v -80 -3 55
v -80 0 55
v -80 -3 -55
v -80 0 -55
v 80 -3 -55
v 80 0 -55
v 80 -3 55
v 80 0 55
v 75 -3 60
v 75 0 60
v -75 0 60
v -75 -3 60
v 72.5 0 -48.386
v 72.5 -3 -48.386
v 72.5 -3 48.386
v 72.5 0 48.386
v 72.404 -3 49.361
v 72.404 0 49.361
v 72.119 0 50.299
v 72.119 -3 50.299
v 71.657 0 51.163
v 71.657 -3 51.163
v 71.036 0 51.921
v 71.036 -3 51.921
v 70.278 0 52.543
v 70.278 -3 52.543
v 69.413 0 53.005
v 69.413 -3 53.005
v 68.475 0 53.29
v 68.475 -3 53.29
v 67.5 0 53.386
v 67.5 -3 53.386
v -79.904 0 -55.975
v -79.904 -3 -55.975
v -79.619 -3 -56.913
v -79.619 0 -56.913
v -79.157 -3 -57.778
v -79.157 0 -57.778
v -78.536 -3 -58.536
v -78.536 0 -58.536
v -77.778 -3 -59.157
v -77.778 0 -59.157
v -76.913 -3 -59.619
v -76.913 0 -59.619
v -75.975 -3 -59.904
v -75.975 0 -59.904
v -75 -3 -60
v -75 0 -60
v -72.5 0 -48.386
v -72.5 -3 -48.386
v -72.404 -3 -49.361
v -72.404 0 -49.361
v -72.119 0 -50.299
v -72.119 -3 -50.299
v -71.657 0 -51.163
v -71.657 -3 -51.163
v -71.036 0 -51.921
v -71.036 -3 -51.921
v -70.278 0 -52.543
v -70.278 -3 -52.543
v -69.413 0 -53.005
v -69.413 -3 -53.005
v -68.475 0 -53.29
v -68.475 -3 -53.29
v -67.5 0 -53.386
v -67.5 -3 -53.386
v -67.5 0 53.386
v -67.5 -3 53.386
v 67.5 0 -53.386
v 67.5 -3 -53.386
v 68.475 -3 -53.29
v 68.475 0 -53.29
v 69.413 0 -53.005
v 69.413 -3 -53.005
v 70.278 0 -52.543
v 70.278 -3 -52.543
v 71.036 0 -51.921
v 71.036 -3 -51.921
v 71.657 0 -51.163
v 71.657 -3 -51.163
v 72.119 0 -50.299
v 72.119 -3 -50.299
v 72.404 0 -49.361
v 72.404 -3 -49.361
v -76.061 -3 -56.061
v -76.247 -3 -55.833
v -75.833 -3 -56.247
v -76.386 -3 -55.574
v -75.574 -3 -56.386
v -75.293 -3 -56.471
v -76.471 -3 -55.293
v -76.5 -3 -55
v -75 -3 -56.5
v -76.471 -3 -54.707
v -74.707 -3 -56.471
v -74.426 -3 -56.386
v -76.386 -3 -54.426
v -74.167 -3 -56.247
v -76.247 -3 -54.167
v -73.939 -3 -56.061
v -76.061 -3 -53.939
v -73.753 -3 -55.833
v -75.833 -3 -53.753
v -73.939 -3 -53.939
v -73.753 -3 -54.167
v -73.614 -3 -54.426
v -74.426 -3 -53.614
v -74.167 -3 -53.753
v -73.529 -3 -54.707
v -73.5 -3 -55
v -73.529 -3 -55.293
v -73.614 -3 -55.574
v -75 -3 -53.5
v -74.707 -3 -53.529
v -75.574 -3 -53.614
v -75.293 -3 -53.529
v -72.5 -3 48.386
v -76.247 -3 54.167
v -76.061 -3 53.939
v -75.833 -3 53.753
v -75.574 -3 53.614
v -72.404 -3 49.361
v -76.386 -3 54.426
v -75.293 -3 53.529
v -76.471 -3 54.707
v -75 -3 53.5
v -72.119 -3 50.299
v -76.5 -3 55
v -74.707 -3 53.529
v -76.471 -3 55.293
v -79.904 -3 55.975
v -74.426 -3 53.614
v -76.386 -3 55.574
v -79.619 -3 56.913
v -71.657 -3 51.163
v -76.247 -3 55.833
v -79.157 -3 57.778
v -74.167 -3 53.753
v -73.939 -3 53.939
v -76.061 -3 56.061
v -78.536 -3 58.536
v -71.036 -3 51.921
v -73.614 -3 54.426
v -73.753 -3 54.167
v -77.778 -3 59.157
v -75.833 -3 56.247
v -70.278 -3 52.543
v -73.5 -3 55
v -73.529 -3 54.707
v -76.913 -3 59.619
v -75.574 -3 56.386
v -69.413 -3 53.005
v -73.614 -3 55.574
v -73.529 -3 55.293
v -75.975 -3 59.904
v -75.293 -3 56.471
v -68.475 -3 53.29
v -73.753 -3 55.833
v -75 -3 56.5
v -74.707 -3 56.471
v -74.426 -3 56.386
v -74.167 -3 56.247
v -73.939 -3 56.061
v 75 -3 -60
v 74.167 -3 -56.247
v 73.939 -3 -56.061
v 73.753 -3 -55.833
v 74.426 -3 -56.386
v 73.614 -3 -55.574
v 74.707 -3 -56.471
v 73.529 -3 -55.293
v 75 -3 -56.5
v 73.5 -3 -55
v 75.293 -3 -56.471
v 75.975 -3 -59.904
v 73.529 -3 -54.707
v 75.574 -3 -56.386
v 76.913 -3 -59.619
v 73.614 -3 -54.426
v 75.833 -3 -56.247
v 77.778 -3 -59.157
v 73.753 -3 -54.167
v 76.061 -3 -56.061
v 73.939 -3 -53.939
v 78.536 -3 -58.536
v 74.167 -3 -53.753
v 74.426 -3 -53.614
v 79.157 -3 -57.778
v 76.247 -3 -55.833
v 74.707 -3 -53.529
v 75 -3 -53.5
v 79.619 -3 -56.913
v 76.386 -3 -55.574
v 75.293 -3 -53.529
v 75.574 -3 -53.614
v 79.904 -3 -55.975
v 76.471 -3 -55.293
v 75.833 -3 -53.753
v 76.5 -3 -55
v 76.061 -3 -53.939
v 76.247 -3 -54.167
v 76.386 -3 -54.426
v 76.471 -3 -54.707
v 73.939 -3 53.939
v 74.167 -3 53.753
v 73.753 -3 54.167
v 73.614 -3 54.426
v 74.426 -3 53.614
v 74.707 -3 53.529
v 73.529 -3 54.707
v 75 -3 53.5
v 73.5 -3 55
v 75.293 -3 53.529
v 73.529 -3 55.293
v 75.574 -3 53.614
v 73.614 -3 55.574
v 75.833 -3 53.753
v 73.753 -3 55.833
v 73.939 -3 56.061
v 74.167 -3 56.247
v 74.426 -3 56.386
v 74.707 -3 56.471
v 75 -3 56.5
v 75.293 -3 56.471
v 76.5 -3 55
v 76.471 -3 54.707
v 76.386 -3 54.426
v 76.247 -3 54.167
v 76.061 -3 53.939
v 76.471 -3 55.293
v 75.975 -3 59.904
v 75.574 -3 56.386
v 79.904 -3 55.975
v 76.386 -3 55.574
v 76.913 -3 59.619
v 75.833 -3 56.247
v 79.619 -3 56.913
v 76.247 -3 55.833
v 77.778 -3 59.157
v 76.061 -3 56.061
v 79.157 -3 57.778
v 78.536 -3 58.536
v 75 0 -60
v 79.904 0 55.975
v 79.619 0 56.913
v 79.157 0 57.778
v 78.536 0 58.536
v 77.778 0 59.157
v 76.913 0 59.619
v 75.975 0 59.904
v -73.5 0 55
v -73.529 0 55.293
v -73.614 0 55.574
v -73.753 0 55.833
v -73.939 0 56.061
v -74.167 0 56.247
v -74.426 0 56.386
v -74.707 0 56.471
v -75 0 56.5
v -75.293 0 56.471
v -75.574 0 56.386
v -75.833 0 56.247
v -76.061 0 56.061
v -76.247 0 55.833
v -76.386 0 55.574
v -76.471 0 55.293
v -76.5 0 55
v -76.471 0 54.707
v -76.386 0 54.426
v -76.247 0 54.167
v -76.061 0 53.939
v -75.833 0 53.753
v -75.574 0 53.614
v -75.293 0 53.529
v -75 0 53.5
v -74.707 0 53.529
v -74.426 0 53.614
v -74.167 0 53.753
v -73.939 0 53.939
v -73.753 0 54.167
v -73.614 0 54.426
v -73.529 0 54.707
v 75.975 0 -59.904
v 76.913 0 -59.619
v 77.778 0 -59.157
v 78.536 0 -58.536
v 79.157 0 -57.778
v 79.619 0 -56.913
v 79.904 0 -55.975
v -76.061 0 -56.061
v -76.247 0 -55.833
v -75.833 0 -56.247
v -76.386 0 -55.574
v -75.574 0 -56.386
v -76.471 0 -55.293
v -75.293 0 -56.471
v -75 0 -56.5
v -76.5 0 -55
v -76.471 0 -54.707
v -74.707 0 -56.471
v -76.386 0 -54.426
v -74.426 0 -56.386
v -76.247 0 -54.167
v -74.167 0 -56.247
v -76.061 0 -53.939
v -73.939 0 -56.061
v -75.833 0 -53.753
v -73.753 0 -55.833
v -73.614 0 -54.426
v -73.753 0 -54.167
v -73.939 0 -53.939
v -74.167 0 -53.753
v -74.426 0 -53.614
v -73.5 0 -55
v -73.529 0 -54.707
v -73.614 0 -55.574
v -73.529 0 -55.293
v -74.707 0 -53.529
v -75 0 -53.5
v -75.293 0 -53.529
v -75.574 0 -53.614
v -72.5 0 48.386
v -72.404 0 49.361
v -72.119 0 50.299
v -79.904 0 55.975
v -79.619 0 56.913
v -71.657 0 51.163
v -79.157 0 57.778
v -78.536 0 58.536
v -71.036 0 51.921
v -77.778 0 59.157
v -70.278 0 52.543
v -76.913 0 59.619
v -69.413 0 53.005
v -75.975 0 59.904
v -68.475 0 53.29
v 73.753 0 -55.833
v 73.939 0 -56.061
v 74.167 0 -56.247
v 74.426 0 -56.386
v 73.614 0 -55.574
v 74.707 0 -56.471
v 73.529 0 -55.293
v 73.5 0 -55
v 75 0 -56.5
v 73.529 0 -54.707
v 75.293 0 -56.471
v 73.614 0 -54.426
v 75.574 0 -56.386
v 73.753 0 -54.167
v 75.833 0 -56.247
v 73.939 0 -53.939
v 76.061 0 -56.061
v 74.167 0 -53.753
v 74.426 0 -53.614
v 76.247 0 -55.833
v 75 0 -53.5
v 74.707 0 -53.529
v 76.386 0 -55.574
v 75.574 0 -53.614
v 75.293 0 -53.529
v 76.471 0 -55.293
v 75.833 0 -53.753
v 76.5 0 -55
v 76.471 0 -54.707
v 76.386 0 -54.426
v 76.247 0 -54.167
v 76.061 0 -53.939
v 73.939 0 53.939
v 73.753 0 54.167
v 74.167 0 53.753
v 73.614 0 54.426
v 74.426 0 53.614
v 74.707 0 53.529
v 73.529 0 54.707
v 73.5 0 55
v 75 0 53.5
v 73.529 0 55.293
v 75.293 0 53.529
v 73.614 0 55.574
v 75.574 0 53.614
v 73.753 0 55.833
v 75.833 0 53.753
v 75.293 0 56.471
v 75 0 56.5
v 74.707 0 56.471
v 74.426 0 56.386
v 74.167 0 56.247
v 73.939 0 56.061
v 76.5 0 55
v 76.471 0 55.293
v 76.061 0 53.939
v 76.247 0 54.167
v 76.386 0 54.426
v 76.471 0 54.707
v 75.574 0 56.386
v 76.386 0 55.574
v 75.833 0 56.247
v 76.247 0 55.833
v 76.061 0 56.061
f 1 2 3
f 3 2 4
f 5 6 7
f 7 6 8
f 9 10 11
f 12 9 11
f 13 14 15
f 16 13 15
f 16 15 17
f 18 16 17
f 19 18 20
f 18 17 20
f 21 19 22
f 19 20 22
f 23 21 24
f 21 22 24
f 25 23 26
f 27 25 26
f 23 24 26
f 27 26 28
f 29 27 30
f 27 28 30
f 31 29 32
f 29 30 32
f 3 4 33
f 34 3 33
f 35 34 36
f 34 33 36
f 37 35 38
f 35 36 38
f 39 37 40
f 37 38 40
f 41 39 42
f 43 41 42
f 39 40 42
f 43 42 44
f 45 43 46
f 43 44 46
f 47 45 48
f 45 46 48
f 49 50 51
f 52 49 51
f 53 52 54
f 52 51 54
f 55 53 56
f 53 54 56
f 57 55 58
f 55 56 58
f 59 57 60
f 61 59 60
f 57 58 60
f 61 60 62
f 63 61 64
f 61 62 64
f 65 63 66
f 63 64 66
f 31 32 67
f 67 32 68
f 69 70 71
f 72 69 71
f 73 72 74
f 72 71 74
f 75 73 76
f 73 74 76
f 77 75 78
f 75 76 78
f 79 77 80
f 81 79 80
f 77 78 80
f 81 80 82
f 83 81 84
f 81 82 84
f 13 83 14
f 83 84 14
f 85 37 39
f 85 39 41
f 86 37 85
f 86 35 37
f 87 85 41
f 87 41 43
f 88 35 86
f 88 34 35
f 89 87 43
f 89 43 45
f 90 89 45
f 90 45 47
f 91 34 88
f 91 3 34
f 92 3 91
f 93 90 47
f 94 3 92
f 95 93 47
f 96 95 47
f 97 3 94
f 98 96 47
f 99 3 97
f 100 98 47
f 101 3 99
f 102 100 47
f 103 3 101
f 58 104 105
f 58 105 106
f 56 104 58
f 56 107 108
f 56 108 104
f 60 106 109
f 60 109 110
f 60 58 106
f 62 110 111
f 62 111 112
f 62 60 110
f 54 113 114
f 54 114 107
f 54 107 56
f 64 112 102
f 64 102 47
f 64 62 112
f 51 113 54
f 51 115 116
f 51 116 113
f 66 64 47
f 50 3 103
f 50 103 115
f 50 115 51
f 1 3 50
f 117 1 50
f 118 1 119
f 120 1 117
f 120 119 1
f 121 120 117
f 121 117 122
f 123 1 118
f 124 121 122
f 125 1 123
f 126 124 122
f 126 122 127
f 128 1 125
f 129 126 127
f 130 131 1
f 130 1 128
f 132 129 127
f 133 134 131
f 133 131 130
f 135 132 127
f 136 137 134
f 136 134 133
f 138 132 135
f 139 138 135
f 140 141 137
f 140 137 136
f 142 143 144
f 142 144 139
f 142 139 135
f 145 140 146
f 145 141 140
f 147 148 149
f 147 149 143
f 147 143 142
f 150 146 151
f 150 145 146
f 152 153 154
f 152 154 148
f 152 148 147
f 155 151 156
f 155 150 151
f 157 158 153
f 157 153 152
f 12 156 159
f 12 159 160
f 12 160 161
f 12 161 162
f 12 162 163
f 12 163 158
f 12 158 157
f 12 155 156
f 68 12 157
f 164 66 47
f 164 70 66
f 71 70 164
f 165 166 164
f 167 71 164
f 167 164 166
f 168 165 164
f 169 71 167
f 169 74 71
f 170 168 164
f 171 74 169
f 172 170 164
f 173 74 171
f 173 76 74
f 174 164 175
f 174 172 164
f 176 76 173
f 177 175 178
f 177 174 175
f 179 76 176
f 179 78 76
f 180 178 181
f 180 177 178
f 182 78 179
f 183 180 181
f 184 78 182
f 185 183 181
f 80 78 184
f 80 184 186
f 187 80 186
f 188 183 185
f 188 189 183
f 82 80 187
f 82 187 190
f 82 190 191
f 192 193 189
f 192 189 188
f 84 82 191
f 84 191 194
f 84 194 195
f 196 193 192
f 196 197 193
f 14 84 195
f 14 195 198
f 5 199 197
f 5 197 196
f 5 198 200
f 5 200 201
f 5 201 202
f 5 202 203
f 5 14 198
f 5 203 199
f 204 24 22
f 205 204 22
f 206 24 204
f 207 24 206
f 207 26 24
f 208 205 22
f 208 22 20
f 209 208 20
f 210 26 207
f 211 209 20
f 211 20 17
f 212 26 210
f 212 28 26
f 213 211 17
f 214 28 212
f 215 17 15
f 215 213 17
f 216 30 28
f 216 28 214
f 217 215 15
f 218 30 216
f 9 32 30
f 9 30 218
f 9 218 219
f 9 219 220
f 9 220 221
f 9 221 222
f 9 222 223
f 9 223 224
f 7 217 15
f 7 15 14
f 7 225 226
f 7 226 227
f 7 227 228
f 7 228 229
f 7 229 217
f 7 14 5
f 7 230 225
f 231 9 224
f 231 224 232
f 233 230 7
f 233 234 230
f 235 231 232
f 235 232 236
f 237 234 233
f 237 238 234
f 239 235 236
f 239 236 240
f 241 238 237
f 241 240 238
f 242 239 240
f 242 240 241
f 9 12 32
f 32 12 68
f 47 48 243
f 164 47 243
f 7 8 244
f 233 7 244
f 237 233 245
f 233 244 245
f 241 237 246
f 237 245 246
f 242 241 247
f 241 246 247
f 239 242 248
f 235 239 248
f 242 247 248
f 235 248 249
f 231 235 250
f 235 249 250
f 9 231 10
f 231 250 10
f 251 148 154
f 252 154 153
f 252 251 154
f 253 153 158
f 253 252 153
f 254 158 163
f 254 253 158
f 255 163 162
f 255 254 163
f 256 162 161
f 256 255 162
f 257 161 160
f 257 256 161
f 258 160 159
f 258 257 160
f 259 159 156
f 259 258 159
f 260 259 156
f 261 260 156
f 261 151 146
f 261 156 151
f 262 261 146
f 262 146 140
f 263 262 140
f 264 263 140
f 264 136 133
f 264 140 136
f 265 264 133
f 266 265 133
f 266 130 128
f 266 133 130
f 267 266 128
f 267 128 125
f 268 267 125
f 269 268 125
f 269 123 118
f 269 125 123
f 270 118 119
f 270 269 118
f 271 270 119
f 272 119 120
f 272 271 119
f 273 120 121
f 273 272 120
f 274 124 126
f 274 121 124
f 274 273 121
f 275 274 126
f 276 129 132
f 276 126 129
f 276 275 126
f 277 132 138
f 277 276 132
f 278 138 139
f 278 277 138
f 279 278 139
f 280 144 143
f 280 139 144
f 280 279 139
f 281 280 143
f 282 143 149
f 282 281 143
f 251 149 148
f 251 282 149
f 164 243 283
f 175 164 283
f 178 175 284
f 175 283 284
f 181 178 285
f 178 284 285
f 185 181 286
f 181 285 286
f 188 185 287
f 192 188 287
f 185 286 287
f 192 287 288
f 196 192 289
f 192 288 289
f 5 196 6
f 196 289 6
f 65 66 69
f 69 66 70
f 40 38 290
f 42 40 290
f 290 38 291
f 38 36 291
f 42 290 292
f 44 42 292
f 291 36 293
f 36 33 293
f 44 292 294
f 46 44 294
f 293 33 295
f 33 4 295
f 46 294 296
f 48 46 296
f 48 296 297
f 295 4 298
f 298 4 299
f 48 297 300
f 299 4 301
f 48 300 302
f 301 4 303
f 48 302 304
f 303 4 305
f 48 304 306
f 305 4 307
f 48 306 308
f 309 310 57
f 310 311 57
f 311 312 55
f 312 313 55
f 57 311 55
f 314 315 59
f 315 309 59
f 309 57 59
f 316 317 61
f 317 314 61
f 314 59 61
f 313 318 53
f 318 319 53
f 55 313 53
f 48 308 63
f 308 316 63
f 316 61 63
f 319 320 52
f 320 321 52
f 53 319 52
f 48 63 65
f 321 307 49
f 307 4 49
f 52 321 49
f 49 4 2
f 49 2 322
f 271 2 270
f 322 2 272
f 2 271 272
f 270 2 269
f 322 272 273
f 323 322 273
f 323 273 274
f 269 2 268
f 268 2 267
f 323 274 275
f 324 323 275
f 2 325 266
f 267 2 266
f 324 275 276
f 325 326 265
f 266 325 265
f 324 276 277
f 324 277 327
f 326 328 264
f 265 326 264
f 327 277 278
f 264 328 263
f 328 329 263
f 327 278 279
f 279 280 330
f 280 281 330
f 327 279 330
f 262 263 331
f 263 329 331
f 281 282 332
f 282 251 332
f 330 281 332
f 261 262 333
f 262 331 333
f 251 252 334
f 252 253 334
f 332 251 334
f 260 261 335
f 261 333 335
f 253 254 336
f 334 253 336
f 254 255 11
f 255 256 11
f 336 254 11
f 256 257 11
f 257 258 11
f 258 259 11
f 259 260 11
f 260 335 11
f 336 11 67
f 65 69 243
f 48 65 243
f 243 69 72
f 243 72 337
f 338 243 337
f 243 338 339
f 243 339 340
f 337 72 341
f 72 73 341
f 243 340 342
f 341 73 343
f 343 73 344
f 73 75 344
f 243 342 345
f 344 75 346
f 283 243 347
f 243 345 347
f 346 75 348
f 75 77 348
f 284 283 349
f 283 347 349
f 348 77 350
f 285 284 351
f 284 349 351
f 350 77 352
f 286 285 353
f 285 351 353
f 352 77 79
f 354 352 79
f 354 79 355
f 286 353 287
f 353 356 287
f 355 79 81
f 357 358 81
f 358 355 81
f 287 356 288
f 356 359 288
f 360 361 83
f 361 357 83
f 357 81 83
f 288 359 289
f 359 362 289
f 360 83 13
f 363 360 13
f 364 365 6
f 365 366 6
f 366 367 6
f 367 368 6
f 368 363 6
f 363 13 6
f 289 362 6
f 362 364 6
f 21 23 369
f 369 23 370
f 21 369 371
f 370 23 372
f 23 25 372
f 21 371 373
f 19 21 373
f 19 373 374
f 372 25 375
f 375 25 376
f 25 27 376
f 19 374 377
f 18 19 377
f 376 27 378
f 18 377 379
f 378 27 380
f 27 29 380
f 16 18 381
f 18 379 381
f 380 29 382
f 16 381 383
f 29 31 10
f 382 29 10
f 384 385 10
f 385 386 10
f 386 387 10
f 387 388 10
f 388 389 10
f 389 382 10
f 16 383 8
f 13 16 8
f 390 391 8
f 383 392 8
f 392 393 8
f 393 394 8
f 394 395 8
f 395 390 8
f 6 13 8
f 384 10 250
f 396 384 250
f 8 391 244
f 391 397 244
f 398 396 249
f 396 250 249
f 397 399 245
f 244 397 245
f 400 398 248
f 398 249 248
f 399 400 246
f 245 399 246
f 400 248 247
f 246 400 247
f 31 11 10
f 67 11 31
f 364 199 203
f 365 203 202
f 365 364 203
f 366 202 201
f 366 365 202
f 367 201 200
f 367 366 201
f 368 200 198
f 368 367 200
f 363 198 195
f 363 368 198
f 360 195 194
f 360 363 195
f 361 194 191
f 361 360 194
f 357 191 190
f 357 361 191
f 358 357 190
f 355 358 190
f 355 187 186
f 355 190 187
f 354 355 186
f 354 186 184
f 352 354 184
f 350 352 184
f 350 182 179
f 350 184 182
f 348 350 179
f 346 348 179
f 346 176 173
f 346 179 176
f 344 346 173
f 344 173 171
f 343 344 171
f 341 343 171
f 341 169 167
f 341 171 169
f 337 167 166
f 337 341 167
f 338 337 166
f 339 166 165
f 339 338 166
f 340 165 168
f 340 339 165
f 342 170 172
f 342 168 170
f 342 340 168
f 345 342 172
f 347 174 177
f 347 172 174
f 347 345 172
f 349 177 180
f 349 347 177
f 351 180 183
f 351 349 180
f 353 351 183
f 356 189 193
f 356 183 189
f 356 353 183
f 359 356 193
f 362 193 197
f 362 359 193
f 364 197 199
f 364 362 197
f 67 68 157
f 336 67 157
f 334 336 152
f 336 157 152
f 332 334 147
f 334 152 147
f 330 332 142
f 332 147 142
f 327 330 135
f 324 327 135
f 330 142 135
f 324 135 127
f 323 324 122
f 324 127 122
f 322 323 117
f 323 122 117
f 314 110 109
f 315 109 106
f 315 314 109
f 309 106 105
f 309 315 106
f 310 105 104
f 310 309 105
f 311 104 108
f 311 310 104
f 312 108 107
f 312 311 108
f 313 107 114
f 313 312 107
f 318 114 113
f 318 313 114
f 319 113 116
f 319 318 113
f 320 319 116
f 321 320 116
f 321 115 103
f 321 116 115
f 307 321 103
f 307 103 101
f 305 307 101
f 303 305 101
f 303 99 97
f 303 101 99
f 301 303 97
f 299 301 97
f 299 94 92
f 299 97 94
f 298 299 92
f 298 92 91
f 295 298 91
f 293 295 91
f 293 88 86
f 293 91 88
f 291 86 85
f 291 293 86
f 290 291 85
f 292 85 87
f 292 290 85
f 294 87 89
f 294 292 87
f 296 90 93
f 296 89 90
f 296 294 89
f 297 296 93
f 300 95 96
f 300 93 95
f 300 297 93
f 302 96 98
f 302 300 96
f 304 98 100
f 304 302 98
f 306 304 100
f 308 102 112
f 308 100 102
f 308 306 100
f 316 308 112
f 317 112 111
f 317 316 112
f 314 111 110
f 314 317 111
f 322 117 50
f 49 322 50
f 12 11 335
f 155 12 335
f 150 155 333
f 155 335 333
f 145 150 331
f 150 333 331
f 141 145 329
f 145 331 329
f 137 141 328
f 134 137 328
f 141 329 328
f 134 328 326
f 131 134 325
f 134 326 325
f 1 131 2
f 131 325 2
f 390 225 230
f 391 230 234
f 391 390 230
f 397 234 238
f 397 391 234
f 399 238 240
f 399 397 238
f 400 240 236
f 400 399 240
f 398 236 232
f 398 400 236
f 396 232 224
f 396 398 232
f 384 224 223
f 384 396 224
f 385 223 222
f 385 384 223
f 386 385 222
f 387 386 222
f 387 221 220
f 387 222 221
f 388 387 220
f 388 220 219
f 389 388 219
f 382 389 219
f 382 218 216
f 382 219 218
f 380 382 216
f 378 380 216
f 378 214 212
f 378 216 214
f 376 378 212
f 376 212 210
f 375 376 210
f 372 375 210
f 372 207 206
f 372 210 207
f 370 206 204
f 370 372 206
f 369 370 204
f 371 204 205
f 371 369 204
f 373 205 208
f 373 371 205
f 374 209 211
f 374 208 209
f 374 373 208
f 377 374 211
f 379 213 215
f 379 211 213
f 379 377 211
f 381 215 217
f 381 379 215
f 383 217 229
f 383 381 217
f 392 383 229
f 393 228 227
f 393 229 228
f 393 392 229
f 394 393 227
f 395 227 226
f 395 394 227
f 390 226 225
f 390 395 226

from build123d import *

# Parameters (mm, degrees)
F1_DEPTH = 3
F2_R     = 1.5
F3_DEPTH = 25
F5_DEPTH = 3


with BuildPart() as f1:
    # F0 (on Front) → F1 (new body)
    with BuildSketch(Plane.XZ):
        with BuildLine():
            Line((-75, -60), (75, -60))
            ThreePointArc((75, -60), (78.535534, -58.535534), (80, -55))
            Line((80, -55), (80, 55))
            ThreePointArc((80, 55), (78.535534, 58.535534), (75, 60))
            Line((75, 60), (-75, 60))
            ThreePointArc((-75, 60), (-78.535534, 58.535534), (-80, 55))
            Line((-80, 55), (-80, -55))
            ThreePointArc((-80, -55), (-78.535534, -58.535534), (-75, -60))
        make_face()
    extrude(amount=F1_DEPTH)

    # F2 (on Front) → F3 (cut)
    with BuildSketch(Plane.XZ):
        with Locations((-75, 55)):
            Circle(F2_R)
        with Locations((75, 55)):
            Circle(F2_R)
        with Locations((75, -55)):
            Circle(F2_R)
        with Locations((-75, -55)):
            Circle(F2_R)
    extrude(amount=F3_DEPTH, mode=Mode.SUBTRACT)

    # F4 (on face) → F5 (cut)
    with BuildSketch(Plane.XZ.offset(3)):
        with BuildLine():
            ThreePointArc((72.5, 48.385622), (71.035534, 51.921156), (67.5, 53.385622))
            Line((67.5, 53.385622), (-67.5, 53.385622))
            ThreePointArc((-67.5, 53.385622), (-71.035534, 51.921156), (-72.5, 48.385622))
            Line((-72.5, 48.385622), (-72.5, -48.385622))
            ThreePointArc((-72.5, -48.385622), (-71.035534, -51.921156), (-67.5, -53.385622))
            Line((-67.5, -53.385622), (67.5, -53.385622))
            ThreePointArc((67.5, -53.385622), (71.035534, -51.921156), (72.5, -48.385622))
            Line((72.5, -48.385622), (72.5, 48.385622))
        make_face()
    extrude(amount=-F5_DEPTH, mode=Mode.SUBTRACT)


solid = f1.part
